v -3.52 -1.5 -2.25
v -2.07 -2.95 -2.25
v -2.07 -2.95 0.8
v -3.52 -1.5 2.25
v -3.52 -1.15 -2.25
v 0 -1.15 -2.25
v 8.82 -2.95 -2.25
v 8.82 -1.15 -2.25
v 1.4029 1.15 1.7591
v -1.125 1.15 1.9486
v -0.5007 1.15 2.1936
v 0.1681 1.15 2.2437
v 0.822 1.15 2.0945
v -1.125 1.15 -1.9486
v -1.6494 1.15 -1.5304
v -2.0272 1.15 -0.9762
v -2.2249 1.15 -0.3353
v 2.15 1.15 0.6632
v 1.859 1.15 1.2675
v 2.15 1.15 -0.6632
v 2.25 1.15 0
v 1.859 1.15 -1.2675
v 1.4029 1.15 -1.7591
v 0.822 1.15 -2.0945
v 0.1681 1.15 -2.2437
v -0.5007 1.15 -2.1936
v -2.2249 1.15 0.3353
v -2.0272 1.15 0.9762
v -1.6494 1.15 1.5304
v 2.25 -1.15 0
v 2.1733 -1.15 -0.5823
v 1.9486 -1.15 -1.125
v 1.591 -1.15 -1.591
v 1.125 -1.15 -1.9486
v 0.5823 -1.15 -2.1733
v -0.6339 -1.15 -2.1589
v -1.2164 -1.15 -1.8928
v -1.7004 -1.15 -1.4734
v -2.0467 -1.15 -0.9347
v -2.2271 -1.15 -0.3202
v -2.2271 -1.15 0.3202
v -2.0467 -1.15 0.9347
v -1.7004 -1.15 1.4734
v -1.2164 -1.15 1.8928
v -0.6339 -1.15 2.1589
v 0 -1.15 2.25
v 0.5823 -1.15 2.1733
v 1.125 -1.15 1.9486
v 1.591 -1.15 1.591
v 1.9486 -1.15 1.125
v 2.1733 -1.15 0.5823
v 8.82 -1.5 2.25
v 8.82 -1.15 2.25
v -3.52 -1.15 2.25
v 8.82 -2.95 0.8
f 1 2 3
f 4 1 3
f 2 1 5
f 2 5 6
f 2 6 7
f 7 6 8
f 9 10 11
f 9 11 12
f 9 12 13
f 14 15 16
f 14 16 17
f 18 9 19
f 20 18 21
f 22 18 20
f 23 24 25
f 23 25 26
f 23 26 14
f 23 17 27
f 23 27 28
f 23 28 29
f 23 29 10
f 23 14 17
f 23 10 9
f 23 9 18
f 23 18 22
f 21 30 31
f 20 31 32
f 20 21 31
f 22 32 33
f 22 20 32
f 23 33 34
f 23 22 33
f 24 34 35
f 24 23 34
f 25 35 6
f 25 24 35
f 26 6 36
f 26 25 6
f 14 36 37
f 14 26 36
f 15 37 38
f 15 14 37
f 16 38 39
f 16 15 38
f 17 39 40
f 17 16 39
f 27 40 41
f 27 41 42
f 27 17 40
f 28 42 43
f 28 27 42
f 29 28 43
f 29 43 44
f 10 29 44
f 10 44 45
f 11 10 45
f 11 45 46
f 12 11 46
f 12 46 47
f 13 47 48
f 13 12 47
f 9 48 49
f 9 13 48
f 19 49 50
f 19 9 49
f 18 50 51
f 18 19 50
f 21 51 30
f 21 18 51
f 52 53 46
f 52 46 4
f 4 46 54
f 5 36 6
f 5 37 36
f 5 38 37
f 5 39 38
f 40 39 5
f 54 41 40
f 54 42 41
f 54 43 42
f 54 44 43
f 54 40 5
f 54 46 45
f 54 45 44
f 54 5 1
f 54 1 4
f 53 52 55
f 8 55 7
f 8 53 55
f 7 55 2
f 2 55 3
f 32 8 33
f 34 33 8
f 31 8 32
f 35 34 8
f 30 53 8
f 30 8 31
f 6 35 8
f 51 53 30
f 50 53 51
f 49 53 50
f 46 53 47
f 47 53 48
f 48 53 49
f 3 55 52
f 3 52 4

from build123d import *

# Parameters (mm, degrees)
BOSS_EXTRUDE1_DEPTH      = 1.15
BOSS_EXTRUDE1_DEPTH_BACK = 1.15
SKETCH1_R                = 2.25
BOSS_EXTRUDE2_DEPTH      = 1.8
CHAMFER2_SIZE            = 1.45
CHAMFER4_SIZE            = 1.45


with BuildPart() as part:
    # Sketch1 → Boss-Extrude1 (new, two sides: drawn at the far end of the back side and taken through both)
    with BuildSketch(Plane(origin=(0, 0, 0), x_dir=(1, 0, 0), z_dir=(0, 1, 0)).offset(-BOSS_EXTRUDE1_DEPTH_BACK)):
        Circle(SKETCH1_R)
    extrude(amount=BOSS_EXTRUDE1_DEPTH + BOSS_EXTRUDE1_DEPTH_BACK)

    # Sketch2 → Boss-Extrude2 (add)
    with BuildSketch(Plane.XZ.offset(1.15)):
        Polygon((-3.52, 2.25), (3.52, 2.25), (8.82, 2.25), (8.82, -2.25), (3.52, -2.25), (-3.52, -2.25), align=None)
    extrude(amount=BOSS_EXTRUDE2_DEPTH)

    # Chamfer2
    chamfer2_edges = [part.edges().sort_by_distance(p)[0] for p in [
        (2.65, -2.95, 2.25),
    ]]
    chamfer(chamfer2_edges, length=CHAMFER2_SIZE)

    # Chamfer4
    chamfer4_edges = [part.edges().sort_by_distance(p)[0] for p in [
        (-3.52, -2.95, -0.725),
    ]]
    chamfer(chamfer4_edges, length=CHAMFER4_SIZE)


solid = part.part
